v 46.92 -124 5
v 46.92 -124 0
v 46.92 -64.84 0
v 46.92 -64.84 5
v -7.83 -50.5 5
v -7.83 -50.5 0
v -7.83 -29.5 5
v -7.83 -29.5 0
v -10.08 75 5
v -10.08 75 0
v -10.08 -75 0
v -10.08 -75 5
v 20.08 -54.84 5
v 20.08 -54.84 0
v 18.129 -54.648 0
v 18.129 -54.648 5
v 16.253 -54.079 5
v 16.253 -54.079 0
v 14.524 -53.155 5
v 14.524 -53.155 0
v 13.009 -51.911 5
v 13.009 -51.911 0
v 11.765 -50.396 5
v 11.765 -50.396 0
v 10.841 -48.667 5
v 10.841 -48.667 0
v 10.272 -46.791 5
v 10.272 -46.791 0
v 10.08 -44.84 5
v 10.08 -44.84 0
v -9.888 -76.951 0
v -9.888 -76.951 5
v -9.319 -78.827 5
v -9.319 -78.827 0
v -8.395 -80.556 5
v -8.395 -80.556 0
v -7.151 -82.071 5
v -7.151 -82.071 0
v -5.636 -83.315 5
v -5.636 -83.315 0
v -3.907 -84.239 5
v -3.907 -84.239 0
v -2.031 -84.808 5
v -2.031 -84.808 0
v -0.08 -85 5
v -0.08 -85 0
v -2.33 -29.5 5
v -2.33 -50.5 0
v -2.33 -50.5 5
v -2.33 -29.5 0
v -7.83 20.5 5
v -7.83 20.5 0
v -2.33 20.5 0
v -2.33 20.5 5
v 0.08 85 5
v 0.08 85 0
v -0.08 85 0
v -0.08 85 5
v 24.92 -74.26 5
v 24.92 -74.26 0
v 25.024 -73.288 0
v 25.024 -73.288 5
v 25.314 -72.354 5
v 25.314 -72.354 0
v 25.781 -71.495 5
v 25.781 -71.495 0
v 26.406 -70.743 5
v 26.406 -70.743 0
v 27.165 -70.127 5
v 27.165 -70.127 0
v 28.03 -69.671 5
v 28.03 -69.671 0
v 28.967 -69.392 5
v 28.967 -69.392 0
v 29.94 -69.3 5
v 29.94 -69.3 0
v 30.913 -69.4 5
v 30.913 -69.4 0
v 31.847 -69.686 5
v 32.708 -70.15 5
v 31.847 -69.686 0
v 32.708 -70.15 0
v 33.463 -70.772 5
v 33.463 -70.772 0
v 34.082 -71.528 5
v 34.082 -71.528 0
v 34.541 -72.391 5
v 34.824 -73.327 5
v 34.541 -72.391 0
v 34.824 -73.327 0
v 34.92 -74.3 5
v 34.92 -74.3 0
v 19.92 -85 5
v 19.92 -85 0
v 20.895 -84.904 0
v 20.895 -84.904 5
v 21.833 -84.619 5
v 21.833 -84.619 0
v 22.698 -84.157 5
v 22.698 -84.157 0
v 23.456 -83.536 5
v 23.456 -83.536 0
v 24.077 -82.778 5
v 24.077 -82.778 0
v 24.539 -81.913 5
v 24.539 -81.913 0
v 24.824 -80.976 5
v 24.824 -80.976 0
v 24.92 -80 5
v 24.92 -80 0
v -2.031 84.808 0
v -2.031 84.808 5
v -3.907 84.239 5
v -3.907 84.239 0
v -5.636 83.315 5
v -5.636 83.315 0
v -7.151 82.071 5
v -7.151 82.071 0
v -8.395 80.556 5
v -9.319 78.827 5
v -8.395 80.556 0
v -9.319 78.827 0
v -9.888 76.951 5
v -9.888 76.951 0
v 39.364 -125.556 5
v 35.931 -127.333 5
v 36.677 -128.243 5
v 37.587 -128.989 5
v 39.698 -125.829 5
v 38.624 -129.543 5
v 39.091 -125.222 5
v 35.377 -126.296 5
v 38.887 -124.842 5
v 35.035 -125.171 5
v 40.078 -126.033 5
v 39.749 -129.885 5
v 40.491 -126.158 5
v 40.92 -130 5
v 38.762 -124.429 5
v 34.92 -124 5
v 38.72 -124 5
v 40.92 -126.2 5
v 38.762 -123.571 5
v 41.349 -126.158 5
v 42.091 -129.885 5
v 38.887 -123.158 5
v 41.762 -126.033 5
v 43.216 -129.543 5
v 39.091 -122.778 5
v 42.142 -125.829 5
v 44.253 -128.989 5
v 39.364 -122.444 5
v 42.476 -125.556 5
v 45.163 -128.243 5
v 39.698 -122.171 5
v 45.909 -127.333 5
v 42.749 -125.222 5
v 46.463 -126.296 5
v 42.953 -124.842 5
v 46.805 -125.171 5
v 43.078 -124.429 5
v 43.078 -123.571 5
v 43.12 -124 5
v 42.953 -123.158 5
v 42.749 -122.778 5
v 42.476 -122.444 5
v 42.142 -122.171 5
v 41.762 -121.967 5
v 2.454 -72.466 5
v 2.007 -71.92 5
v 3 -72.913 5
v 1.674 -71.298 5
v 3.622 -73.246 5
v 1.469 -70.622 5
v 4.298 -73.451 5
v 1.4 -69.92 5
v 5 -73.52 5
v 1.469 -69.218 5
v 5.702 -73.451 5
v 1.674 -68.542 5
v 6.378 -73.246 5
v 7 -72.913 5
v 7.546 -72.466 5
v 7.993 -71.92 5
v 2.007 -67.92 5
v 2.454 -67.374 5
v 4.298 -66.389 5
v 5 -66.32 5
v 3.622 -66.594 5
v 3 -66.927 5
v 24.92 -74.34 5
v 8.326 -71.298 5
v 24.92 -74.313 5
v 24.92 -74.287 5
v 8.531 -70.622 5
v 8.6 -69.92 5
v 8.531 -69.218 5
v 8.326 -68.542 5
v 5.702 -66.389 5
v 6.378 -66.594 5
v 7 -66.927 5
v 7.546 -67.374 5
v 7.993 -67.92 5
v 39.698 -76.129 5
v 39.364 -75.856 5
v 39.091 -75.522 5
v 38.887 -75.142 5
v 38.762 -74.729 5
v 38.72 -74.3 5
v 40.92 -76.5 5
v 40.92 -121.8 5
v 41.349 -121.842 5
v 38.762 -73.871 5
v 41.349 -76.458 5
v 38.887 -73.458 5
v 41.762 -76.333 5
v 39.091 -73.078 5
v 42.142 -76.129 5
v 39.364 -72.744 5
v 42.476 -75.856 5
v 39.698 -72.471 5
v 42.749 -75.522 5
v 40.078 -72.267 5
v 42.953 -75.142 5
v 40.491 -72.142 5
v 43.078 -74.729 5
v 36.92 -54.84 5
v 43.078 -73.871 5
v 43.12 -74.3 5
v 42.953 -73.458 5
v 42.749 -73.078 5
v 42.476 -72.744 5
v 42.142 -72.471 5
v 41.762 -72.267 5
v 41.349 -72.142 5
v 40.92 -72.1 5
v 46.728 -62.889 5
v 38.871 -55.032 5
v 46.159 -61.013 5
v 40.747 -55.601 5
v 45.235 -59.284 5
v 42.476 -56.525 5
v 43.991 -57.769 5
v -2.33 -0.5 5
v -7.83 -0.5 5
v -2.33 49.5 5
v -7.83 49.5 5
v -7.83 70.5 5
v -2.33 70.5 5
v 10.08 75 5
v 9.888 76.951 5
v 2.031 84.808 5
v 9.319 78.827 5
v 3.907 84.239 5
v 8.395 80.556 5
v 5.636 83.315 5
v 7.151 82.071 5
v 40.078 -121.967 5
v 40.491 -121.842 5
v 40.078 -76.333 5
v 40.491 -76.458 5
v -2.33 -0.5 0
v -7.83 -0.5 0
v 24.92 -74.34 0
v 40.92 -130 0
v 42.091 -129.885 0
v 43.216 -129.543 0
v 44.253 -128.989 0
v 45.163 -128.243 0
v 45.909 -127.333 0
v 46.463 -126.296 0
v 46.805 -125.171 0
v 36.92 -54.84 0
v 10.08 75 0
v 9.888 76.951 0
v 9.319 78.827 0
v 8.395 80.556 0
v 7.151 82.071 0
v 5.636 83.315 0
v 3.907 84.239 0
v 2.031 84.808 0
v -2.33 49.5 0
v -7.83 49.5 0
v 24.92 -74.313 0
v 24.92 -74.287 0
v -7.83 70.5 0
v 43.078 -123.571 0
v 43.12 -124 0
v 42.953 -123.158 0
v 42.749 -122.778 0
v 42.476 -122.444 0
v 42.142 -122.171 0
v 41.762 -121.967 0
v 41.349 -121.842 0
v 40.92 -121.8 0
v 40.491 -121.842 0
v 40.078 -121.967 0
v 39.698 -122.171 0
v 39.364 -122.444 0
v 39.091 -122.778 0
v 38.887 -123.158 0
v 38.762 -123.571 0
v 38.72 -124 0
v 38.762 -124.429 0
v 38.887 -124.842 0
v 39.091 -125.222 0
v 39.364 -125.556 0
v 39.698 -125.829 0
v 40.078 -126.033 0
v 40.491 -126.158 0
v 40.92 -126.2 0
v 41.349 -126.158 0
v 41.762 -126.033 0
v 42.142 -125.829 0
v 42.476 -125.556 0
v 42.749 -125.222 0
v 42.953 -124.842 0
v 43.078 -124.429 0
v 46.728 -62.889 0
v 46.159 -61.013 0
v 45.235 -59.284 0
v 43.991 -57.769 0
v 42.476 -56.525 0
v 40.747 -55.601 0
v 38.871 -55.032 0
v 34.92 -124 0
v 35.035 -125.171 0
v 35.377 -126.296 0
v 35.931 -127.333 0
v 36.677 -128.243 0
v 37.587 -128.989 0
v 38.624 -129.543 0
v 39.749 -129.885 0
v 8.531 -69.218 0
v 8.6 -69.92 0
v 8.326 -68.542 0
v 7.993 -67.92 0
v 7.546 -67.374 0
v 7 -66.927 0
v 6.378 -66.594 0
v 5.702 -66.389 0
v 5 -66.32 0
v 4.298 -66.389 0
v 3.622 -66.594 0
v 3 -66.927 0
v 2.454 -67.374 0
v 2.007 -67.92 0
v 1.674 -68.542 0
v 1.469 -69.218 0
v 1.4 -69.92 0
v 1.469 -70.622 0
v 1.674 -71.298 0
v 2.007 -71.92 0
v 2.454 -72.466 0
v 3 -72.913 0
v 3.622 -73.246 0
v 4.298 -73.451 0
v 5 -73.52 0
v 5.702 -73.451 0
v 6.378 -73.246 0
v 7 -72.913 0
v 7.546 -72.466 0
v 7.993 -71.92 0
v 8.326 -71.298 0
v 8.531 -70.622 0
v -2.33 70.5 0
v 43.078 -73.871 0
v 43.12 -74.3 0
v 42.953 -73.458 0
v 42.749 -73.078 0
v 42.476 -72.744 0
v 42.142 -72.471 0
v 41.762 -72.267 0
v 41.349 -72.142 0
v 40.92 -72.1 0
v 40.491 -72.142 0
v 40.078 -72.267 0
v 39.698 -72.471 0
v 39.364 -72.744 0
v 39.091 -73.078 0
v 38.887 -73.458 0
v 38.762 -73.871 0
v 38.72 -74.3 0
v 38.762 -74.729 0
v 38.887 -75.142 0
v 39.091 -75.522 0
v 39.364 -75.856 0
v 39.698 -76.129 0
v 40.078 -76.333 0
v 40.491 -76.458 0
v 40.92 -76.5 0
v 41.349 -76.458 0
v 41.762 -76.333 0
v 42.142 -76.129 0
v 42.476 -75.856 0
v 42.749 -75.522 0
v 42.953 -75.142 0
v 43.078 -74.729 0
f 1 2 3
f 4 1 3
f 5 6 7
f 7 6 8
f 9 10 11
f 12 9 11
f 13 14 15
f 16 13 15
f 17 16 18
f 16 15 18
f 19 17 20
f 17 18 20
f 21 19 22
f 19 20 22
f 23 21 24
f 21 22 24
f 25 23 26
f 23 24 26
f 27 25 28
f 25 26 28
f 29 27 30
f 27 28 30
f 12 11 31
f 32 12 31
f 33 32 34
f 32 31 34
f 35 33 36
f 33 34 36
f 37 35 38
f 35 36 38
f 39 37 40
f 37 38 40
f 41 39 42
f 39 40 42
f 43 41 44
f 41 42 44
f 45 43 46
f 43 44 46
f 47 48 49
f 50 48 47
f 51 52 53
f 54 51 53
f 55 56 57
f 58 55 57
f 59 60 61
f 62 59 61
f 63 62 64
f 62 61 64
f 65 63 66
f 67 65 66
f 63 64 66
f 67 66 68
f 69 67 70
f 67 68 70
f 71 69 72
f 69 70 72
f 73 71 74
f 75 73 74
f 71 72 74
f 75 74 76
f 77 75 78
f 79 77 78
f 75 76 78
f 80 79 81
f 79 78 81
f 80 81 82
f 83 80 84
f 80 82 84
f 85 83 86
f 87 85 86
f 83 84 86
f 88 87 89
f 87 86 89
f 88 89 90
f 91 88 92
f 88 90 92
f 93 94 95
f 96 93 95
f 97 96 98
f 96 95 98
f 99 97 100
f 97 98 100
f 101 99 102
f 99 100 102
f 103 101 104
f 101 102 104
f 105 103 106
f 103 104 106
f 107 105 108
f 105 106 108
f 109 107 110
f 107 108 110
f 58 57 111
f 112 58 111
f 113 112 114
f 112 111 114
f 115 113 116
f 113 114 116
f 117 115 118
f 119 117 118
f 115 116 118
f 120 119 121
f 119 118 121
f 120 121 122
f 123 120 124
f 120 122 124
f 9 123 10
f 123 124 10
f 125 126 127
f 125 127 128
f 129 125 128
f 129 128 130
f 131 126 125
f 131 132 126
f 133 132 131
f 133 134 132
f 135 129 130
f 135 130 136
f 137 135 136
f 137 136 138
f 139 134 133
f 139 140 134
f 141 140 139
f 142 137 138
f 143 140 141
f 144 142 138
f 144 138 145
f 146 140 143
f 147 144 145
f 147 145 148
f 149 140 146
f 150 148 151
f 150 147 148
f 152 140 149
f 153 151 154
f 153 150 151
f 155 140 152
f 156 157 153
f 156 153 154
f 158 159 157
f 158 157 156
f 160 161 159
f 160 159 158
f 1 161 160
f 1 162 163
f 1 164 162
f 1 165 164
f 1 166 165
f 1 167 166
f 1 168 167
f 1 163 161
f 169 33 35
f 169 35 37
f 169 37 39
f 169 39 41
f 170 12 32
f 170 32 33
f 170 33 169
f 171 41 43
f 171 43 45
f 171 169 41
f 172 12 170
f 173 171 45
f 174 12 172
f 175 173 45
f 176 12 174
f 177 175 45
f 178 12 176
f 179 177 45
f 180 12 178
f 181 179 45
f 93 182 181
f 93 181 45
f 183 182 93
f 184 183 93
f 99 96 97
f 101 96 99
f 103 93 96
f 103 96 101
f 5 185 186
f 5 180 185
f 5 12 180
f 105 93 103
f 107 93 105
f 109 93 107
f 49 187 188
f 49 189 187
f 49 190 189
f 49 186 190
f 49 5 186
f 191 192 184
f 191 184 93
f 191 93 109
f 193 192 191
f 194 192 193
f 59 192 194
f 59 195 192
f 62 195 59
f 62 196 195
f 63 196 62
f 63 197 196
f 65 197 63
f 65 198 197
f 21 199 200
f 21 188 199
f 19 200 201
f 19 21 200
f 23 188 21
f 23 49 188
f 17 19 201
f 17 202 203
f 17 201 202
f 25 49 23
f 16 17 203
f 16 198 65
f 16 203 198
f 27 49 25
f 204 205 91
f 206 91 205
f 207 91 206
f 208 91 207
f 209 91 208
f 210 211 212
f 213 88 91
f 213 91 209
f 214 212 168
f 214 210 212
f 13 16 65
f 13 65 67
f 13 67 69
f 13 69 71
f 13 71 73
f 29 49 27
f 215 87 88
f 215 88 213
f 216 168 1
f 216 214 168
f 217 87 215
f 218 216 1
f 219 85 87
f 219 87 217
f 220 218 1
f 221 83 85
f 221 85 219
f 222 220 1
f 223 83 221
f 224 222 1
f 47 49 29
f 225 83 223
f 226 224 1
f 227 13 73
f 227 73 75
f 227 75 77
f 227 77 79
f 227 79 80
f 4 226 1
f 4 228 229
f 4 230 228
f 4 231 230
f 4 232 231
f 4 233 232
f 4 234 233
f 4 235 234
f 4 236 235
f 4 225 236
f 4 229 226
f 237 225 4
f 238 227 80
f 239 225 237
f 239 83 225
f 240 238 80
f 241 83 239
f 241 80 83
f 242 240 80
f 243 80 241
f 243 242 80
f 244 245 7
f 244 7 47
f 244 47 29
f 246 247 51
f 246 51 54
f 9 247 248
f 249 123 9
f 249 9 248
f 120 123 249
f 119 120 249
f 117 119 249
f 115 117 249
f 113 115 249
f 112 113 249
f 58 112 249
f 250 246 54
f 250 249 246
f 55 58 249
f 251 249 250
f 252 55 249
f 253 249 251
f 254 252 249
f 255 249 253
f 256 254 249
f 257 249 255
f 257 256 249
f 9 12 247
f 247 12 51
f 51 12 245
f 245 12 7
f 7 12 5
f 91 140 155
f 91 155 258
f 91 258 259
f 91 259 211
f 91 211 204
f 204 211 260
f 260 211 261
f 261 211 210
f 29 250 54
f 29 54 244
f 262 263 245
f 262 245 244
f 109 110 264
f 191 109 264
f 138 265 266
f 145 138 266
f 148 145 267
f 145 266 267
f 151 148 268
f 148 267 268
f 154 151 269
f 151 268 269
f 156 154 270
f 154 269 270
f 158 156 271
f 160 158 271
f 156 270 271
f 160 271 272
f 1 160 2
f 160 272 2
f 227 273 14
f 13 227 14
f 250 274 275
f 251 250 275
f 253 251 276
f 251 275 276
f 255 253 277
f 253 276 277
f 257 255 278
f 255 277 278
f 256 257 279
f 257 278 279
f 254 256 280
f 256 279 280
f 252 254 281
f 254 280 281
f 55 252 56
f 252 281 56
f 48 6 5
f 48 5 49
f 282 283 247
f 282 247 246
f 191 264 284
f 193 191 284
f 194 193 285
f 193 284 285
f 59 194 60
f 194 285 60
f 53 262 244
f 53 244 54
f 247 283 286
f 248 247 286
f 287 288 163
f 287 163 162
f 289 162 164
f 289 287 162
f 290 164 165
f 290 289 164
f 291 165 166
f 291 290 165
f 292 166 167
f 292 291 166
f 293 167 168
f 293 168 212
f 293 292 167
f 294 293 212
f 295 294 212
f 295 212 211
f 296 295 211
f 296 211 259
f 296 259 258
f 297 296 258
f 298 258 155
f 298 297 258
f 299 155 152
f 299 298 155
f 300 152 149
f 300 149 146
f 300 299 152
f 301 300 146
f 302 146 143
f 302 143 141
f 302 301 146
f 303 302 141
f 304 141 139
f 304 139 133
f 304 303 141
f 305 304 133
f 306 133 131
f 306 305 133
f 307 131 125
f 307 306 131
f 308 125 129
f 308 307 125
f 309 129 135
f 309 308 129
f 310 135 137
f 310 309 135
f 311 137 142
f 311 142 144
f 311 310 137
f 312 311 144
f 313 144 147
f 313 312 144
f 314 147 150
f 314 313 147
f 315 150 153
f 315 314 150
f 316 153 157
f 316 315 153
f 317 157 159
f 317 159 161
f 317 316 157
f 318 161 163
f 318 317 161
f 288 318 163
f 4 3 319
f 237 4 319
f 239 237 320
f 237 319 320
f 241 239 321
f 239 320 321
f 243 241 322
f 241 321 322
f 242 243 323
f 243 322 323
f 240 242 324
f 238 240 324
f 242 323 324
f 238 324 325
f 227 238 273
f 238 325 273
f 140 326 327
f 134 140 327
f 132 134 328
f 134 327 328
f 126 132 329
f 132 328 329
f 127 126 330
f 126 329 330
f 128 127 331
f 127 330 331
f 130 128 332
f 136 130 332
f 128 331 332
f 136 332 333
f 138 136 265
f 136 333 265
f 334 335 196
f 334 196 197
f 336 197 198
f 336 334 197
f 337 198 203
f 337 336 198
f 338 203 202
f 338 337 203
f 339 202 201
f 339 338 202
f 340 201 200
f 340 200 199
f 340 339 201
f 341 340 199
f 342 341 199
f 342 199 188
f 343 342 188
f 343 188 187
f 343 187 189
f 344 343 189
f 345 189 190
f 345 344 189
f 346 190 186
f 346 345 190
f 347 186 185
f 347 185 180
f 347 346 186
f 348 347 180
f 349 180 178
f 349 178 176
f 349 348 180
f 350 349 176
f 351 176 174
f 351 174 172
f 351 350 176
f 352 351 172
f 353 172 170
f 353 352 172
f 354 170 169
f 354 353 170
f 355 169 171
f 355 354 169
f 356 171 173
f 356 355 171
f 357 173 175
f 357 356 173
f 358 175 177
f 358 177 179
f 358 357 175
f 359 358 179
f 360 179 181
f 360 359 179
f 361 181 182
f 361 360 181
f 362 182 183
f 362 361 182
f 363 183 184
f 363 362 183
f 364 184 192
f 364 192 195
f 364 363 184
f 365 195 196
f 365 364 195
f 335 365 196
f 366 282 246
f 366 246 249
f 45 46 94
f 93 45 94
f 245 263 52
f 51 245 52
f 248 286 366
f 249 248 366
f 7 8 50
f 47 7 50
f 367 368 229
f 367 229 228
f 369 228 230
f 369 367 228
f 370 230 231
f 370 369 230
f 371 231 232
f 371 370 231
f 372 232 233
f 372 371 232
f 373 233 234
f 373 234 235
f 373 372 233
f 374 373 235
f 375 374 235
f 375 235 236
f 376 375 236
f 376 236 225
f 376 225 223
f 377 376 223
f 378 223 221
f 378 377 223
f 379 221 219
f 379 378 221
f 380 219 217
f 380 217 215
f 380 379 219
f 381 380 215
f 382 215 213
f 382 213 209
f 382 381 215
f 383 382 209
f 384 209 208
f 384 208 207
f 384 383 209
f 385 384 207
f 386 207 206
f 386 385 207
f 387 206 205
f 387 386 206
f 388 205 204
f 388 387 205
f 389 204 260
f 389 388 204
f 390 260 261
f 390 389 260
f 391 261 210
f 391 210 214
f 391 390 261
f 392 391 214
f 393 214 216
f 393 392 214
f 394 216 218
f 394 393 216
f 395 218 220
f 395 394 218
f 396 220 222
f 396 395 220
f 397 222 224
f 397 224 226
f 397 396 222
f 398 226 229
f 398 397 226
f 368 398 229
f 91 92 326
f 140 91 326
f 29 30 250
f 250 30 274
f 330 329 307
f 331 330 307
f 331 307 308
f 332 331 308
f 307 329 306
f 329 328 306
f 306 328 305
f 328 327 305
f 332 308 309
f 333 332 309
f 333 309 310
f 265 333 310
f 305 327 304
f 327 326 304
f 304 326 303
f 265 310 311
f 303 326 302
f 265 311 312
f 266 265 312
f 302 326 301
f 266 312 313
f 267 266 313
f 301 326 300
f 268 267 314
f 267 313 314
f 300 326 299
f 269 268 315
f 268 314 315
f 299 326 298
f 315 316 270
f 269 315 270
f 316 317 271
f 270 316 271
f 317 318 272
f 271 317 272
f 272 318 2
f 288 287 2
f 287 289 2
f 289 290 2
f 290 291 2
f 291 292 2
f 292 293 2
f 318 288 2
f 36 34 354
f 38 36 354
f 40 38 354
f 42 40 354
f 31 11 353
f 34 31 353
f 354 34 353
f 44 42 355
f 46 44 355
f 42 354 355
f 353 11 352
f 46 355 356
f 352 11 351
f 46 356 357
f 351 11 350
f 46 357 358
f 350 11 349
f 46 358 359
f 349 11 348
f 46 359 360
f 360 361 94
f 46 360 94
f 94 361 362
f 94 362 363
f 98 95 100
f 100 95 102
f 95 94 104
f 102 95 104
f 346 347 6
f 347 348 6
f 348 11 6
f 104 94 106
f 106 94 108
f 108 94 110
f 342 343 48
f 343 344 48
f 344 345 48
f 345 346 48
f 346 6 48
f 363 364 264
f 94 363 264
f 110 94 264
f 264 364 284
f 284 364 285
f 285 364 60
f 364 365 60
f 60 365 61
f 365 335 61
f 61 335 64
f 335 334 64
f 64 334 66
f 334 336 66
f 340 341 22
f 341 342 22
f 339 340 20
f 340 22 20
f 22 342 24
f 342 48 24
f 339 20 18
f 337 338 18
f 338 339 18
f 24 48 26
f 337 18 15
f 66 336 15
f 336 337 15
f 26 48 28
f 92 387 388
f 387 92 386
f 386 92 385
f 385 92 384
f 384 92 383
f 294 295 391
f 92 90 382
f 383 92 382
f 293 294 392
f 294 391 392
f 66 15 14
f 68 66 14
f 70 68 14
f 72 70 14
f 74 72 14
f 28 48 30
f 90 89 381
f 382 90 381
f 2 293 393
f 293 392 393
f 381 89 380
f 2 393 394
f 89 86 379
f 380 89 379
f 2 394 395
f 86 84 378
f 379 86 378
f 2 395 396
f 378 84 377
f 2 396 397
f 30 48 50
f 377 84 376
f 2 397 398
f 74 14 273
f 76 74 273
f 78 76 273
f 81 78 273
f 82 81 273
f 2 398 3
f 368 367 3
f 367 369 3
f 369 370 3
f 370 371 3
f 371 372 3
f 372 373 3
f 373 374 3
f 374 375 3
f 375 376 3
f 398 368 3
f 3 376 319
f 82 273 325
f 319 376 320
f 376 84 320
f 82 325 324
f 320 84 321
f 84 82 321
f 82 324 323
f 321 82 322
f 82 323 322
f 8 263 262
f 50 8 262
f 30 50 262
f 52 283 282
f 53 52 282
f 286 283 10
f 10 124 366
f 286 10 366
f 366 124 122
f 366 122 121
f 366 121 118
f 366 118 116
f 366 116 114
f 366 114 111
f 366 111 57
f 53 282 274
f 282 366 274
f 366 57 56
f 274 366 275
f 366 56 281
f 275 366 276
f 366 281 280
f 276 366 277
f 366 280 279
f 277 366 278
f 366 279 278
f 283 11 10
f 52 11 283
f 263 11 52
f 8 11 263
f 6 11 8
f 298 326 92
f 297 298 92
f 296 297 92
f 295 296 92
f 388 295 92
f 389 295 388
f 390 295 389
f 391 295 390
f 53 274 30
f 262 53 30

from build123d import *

# Parameters (mm, degrees)
F0_W     = 5.5
F0_H     = 21
F0_R     = 3.6
F0_R_2   = 2.2
F1_DEPTH = 5


with BuildPart() as f1:
    # F0 (on Top) → F1 (new body)
    with BuildSketch(Plane.XY):
        with BuildLine():
            ThreePointArc((10.08, 75), (7.151068, 82.071068), (0.08, 85))
            Line((0.08, 85), (-0.08, 85))
            ThreePointArc((-0.08, 85), (-7.151068, 82.071068), (-10.08, 75))
            Line((-10.08, 75), (-10.08, -75))
            ThreePointArc((-10.08, -75), (-7.151068, -82.071068), (-0.08, -85))
            Line((-0.08, -85), (10.08, -85))
            Line((10.08, -85), (19.920046, -85))
            ThreePointArc((19.920046, -85), (23.455545, -83.535569), (24.920046, -80.0001))
            Line((24.920046, -80.0001), (24.92016, -74.339954))
            ThreePointArc((24.92016, -74.339954), (24.92, -74.2999), (24.920161, -74.259846))
            ThreePointArc((24.920161, -74.259846), (29.940077, -69.30004), (34.92, -74.3))
            Line((34.92, -74.3), (34.92, -124))
            ThreePointArc((34.92, -124), (36.677359, -128.242641), (40.92, -130))
            ThreePointArc((40.92, -130), (45.162641, -128.242641), (46.92, -124))
            Line((46.92, -124), (46.92, -64.84))
            ThreePointArc((46.92, -64.84), (43.991068, -57.768932), (36.92, -54.84))
            Line((36.92, -54.84), (34.92, -54.84))
            Line((34.92, -54.84), (20.08, -54.84))
            ThreePointArc((20.08, -54.84), (13.008932, -51.911068), (10.08, -44.84))
            Line((10.08, -44.84), (10.08, 75))
        make_face()
        with Locations((-5.08, -40)):
            Rectangle(F0_W, F0_H, mode=Mode.SUBTRACT)
        with Locations((5, -69.92)):
            Circle(F0_R, mode=Mode.SUBTRACT)
        with Locations((40.92, -124)):
            Circle(F0_R_2, mode=Mode.SUBTRACT)
        with Locations((40.92, -74.3)):
            Circle(F0_R_2, mode=Mode.SUBTRACT)
        with Locations((-5.08, 10)):
            Rectangle(F0_W, F0_H, mode=Mode.SUBTRACT)
        with Locations((-5.08, 60)):
            Rectangle(F0_W, F0_H, mode=Mode.SUBTRACT)
    extrude(amount=F1_DEPTH)


solid = f1.part
